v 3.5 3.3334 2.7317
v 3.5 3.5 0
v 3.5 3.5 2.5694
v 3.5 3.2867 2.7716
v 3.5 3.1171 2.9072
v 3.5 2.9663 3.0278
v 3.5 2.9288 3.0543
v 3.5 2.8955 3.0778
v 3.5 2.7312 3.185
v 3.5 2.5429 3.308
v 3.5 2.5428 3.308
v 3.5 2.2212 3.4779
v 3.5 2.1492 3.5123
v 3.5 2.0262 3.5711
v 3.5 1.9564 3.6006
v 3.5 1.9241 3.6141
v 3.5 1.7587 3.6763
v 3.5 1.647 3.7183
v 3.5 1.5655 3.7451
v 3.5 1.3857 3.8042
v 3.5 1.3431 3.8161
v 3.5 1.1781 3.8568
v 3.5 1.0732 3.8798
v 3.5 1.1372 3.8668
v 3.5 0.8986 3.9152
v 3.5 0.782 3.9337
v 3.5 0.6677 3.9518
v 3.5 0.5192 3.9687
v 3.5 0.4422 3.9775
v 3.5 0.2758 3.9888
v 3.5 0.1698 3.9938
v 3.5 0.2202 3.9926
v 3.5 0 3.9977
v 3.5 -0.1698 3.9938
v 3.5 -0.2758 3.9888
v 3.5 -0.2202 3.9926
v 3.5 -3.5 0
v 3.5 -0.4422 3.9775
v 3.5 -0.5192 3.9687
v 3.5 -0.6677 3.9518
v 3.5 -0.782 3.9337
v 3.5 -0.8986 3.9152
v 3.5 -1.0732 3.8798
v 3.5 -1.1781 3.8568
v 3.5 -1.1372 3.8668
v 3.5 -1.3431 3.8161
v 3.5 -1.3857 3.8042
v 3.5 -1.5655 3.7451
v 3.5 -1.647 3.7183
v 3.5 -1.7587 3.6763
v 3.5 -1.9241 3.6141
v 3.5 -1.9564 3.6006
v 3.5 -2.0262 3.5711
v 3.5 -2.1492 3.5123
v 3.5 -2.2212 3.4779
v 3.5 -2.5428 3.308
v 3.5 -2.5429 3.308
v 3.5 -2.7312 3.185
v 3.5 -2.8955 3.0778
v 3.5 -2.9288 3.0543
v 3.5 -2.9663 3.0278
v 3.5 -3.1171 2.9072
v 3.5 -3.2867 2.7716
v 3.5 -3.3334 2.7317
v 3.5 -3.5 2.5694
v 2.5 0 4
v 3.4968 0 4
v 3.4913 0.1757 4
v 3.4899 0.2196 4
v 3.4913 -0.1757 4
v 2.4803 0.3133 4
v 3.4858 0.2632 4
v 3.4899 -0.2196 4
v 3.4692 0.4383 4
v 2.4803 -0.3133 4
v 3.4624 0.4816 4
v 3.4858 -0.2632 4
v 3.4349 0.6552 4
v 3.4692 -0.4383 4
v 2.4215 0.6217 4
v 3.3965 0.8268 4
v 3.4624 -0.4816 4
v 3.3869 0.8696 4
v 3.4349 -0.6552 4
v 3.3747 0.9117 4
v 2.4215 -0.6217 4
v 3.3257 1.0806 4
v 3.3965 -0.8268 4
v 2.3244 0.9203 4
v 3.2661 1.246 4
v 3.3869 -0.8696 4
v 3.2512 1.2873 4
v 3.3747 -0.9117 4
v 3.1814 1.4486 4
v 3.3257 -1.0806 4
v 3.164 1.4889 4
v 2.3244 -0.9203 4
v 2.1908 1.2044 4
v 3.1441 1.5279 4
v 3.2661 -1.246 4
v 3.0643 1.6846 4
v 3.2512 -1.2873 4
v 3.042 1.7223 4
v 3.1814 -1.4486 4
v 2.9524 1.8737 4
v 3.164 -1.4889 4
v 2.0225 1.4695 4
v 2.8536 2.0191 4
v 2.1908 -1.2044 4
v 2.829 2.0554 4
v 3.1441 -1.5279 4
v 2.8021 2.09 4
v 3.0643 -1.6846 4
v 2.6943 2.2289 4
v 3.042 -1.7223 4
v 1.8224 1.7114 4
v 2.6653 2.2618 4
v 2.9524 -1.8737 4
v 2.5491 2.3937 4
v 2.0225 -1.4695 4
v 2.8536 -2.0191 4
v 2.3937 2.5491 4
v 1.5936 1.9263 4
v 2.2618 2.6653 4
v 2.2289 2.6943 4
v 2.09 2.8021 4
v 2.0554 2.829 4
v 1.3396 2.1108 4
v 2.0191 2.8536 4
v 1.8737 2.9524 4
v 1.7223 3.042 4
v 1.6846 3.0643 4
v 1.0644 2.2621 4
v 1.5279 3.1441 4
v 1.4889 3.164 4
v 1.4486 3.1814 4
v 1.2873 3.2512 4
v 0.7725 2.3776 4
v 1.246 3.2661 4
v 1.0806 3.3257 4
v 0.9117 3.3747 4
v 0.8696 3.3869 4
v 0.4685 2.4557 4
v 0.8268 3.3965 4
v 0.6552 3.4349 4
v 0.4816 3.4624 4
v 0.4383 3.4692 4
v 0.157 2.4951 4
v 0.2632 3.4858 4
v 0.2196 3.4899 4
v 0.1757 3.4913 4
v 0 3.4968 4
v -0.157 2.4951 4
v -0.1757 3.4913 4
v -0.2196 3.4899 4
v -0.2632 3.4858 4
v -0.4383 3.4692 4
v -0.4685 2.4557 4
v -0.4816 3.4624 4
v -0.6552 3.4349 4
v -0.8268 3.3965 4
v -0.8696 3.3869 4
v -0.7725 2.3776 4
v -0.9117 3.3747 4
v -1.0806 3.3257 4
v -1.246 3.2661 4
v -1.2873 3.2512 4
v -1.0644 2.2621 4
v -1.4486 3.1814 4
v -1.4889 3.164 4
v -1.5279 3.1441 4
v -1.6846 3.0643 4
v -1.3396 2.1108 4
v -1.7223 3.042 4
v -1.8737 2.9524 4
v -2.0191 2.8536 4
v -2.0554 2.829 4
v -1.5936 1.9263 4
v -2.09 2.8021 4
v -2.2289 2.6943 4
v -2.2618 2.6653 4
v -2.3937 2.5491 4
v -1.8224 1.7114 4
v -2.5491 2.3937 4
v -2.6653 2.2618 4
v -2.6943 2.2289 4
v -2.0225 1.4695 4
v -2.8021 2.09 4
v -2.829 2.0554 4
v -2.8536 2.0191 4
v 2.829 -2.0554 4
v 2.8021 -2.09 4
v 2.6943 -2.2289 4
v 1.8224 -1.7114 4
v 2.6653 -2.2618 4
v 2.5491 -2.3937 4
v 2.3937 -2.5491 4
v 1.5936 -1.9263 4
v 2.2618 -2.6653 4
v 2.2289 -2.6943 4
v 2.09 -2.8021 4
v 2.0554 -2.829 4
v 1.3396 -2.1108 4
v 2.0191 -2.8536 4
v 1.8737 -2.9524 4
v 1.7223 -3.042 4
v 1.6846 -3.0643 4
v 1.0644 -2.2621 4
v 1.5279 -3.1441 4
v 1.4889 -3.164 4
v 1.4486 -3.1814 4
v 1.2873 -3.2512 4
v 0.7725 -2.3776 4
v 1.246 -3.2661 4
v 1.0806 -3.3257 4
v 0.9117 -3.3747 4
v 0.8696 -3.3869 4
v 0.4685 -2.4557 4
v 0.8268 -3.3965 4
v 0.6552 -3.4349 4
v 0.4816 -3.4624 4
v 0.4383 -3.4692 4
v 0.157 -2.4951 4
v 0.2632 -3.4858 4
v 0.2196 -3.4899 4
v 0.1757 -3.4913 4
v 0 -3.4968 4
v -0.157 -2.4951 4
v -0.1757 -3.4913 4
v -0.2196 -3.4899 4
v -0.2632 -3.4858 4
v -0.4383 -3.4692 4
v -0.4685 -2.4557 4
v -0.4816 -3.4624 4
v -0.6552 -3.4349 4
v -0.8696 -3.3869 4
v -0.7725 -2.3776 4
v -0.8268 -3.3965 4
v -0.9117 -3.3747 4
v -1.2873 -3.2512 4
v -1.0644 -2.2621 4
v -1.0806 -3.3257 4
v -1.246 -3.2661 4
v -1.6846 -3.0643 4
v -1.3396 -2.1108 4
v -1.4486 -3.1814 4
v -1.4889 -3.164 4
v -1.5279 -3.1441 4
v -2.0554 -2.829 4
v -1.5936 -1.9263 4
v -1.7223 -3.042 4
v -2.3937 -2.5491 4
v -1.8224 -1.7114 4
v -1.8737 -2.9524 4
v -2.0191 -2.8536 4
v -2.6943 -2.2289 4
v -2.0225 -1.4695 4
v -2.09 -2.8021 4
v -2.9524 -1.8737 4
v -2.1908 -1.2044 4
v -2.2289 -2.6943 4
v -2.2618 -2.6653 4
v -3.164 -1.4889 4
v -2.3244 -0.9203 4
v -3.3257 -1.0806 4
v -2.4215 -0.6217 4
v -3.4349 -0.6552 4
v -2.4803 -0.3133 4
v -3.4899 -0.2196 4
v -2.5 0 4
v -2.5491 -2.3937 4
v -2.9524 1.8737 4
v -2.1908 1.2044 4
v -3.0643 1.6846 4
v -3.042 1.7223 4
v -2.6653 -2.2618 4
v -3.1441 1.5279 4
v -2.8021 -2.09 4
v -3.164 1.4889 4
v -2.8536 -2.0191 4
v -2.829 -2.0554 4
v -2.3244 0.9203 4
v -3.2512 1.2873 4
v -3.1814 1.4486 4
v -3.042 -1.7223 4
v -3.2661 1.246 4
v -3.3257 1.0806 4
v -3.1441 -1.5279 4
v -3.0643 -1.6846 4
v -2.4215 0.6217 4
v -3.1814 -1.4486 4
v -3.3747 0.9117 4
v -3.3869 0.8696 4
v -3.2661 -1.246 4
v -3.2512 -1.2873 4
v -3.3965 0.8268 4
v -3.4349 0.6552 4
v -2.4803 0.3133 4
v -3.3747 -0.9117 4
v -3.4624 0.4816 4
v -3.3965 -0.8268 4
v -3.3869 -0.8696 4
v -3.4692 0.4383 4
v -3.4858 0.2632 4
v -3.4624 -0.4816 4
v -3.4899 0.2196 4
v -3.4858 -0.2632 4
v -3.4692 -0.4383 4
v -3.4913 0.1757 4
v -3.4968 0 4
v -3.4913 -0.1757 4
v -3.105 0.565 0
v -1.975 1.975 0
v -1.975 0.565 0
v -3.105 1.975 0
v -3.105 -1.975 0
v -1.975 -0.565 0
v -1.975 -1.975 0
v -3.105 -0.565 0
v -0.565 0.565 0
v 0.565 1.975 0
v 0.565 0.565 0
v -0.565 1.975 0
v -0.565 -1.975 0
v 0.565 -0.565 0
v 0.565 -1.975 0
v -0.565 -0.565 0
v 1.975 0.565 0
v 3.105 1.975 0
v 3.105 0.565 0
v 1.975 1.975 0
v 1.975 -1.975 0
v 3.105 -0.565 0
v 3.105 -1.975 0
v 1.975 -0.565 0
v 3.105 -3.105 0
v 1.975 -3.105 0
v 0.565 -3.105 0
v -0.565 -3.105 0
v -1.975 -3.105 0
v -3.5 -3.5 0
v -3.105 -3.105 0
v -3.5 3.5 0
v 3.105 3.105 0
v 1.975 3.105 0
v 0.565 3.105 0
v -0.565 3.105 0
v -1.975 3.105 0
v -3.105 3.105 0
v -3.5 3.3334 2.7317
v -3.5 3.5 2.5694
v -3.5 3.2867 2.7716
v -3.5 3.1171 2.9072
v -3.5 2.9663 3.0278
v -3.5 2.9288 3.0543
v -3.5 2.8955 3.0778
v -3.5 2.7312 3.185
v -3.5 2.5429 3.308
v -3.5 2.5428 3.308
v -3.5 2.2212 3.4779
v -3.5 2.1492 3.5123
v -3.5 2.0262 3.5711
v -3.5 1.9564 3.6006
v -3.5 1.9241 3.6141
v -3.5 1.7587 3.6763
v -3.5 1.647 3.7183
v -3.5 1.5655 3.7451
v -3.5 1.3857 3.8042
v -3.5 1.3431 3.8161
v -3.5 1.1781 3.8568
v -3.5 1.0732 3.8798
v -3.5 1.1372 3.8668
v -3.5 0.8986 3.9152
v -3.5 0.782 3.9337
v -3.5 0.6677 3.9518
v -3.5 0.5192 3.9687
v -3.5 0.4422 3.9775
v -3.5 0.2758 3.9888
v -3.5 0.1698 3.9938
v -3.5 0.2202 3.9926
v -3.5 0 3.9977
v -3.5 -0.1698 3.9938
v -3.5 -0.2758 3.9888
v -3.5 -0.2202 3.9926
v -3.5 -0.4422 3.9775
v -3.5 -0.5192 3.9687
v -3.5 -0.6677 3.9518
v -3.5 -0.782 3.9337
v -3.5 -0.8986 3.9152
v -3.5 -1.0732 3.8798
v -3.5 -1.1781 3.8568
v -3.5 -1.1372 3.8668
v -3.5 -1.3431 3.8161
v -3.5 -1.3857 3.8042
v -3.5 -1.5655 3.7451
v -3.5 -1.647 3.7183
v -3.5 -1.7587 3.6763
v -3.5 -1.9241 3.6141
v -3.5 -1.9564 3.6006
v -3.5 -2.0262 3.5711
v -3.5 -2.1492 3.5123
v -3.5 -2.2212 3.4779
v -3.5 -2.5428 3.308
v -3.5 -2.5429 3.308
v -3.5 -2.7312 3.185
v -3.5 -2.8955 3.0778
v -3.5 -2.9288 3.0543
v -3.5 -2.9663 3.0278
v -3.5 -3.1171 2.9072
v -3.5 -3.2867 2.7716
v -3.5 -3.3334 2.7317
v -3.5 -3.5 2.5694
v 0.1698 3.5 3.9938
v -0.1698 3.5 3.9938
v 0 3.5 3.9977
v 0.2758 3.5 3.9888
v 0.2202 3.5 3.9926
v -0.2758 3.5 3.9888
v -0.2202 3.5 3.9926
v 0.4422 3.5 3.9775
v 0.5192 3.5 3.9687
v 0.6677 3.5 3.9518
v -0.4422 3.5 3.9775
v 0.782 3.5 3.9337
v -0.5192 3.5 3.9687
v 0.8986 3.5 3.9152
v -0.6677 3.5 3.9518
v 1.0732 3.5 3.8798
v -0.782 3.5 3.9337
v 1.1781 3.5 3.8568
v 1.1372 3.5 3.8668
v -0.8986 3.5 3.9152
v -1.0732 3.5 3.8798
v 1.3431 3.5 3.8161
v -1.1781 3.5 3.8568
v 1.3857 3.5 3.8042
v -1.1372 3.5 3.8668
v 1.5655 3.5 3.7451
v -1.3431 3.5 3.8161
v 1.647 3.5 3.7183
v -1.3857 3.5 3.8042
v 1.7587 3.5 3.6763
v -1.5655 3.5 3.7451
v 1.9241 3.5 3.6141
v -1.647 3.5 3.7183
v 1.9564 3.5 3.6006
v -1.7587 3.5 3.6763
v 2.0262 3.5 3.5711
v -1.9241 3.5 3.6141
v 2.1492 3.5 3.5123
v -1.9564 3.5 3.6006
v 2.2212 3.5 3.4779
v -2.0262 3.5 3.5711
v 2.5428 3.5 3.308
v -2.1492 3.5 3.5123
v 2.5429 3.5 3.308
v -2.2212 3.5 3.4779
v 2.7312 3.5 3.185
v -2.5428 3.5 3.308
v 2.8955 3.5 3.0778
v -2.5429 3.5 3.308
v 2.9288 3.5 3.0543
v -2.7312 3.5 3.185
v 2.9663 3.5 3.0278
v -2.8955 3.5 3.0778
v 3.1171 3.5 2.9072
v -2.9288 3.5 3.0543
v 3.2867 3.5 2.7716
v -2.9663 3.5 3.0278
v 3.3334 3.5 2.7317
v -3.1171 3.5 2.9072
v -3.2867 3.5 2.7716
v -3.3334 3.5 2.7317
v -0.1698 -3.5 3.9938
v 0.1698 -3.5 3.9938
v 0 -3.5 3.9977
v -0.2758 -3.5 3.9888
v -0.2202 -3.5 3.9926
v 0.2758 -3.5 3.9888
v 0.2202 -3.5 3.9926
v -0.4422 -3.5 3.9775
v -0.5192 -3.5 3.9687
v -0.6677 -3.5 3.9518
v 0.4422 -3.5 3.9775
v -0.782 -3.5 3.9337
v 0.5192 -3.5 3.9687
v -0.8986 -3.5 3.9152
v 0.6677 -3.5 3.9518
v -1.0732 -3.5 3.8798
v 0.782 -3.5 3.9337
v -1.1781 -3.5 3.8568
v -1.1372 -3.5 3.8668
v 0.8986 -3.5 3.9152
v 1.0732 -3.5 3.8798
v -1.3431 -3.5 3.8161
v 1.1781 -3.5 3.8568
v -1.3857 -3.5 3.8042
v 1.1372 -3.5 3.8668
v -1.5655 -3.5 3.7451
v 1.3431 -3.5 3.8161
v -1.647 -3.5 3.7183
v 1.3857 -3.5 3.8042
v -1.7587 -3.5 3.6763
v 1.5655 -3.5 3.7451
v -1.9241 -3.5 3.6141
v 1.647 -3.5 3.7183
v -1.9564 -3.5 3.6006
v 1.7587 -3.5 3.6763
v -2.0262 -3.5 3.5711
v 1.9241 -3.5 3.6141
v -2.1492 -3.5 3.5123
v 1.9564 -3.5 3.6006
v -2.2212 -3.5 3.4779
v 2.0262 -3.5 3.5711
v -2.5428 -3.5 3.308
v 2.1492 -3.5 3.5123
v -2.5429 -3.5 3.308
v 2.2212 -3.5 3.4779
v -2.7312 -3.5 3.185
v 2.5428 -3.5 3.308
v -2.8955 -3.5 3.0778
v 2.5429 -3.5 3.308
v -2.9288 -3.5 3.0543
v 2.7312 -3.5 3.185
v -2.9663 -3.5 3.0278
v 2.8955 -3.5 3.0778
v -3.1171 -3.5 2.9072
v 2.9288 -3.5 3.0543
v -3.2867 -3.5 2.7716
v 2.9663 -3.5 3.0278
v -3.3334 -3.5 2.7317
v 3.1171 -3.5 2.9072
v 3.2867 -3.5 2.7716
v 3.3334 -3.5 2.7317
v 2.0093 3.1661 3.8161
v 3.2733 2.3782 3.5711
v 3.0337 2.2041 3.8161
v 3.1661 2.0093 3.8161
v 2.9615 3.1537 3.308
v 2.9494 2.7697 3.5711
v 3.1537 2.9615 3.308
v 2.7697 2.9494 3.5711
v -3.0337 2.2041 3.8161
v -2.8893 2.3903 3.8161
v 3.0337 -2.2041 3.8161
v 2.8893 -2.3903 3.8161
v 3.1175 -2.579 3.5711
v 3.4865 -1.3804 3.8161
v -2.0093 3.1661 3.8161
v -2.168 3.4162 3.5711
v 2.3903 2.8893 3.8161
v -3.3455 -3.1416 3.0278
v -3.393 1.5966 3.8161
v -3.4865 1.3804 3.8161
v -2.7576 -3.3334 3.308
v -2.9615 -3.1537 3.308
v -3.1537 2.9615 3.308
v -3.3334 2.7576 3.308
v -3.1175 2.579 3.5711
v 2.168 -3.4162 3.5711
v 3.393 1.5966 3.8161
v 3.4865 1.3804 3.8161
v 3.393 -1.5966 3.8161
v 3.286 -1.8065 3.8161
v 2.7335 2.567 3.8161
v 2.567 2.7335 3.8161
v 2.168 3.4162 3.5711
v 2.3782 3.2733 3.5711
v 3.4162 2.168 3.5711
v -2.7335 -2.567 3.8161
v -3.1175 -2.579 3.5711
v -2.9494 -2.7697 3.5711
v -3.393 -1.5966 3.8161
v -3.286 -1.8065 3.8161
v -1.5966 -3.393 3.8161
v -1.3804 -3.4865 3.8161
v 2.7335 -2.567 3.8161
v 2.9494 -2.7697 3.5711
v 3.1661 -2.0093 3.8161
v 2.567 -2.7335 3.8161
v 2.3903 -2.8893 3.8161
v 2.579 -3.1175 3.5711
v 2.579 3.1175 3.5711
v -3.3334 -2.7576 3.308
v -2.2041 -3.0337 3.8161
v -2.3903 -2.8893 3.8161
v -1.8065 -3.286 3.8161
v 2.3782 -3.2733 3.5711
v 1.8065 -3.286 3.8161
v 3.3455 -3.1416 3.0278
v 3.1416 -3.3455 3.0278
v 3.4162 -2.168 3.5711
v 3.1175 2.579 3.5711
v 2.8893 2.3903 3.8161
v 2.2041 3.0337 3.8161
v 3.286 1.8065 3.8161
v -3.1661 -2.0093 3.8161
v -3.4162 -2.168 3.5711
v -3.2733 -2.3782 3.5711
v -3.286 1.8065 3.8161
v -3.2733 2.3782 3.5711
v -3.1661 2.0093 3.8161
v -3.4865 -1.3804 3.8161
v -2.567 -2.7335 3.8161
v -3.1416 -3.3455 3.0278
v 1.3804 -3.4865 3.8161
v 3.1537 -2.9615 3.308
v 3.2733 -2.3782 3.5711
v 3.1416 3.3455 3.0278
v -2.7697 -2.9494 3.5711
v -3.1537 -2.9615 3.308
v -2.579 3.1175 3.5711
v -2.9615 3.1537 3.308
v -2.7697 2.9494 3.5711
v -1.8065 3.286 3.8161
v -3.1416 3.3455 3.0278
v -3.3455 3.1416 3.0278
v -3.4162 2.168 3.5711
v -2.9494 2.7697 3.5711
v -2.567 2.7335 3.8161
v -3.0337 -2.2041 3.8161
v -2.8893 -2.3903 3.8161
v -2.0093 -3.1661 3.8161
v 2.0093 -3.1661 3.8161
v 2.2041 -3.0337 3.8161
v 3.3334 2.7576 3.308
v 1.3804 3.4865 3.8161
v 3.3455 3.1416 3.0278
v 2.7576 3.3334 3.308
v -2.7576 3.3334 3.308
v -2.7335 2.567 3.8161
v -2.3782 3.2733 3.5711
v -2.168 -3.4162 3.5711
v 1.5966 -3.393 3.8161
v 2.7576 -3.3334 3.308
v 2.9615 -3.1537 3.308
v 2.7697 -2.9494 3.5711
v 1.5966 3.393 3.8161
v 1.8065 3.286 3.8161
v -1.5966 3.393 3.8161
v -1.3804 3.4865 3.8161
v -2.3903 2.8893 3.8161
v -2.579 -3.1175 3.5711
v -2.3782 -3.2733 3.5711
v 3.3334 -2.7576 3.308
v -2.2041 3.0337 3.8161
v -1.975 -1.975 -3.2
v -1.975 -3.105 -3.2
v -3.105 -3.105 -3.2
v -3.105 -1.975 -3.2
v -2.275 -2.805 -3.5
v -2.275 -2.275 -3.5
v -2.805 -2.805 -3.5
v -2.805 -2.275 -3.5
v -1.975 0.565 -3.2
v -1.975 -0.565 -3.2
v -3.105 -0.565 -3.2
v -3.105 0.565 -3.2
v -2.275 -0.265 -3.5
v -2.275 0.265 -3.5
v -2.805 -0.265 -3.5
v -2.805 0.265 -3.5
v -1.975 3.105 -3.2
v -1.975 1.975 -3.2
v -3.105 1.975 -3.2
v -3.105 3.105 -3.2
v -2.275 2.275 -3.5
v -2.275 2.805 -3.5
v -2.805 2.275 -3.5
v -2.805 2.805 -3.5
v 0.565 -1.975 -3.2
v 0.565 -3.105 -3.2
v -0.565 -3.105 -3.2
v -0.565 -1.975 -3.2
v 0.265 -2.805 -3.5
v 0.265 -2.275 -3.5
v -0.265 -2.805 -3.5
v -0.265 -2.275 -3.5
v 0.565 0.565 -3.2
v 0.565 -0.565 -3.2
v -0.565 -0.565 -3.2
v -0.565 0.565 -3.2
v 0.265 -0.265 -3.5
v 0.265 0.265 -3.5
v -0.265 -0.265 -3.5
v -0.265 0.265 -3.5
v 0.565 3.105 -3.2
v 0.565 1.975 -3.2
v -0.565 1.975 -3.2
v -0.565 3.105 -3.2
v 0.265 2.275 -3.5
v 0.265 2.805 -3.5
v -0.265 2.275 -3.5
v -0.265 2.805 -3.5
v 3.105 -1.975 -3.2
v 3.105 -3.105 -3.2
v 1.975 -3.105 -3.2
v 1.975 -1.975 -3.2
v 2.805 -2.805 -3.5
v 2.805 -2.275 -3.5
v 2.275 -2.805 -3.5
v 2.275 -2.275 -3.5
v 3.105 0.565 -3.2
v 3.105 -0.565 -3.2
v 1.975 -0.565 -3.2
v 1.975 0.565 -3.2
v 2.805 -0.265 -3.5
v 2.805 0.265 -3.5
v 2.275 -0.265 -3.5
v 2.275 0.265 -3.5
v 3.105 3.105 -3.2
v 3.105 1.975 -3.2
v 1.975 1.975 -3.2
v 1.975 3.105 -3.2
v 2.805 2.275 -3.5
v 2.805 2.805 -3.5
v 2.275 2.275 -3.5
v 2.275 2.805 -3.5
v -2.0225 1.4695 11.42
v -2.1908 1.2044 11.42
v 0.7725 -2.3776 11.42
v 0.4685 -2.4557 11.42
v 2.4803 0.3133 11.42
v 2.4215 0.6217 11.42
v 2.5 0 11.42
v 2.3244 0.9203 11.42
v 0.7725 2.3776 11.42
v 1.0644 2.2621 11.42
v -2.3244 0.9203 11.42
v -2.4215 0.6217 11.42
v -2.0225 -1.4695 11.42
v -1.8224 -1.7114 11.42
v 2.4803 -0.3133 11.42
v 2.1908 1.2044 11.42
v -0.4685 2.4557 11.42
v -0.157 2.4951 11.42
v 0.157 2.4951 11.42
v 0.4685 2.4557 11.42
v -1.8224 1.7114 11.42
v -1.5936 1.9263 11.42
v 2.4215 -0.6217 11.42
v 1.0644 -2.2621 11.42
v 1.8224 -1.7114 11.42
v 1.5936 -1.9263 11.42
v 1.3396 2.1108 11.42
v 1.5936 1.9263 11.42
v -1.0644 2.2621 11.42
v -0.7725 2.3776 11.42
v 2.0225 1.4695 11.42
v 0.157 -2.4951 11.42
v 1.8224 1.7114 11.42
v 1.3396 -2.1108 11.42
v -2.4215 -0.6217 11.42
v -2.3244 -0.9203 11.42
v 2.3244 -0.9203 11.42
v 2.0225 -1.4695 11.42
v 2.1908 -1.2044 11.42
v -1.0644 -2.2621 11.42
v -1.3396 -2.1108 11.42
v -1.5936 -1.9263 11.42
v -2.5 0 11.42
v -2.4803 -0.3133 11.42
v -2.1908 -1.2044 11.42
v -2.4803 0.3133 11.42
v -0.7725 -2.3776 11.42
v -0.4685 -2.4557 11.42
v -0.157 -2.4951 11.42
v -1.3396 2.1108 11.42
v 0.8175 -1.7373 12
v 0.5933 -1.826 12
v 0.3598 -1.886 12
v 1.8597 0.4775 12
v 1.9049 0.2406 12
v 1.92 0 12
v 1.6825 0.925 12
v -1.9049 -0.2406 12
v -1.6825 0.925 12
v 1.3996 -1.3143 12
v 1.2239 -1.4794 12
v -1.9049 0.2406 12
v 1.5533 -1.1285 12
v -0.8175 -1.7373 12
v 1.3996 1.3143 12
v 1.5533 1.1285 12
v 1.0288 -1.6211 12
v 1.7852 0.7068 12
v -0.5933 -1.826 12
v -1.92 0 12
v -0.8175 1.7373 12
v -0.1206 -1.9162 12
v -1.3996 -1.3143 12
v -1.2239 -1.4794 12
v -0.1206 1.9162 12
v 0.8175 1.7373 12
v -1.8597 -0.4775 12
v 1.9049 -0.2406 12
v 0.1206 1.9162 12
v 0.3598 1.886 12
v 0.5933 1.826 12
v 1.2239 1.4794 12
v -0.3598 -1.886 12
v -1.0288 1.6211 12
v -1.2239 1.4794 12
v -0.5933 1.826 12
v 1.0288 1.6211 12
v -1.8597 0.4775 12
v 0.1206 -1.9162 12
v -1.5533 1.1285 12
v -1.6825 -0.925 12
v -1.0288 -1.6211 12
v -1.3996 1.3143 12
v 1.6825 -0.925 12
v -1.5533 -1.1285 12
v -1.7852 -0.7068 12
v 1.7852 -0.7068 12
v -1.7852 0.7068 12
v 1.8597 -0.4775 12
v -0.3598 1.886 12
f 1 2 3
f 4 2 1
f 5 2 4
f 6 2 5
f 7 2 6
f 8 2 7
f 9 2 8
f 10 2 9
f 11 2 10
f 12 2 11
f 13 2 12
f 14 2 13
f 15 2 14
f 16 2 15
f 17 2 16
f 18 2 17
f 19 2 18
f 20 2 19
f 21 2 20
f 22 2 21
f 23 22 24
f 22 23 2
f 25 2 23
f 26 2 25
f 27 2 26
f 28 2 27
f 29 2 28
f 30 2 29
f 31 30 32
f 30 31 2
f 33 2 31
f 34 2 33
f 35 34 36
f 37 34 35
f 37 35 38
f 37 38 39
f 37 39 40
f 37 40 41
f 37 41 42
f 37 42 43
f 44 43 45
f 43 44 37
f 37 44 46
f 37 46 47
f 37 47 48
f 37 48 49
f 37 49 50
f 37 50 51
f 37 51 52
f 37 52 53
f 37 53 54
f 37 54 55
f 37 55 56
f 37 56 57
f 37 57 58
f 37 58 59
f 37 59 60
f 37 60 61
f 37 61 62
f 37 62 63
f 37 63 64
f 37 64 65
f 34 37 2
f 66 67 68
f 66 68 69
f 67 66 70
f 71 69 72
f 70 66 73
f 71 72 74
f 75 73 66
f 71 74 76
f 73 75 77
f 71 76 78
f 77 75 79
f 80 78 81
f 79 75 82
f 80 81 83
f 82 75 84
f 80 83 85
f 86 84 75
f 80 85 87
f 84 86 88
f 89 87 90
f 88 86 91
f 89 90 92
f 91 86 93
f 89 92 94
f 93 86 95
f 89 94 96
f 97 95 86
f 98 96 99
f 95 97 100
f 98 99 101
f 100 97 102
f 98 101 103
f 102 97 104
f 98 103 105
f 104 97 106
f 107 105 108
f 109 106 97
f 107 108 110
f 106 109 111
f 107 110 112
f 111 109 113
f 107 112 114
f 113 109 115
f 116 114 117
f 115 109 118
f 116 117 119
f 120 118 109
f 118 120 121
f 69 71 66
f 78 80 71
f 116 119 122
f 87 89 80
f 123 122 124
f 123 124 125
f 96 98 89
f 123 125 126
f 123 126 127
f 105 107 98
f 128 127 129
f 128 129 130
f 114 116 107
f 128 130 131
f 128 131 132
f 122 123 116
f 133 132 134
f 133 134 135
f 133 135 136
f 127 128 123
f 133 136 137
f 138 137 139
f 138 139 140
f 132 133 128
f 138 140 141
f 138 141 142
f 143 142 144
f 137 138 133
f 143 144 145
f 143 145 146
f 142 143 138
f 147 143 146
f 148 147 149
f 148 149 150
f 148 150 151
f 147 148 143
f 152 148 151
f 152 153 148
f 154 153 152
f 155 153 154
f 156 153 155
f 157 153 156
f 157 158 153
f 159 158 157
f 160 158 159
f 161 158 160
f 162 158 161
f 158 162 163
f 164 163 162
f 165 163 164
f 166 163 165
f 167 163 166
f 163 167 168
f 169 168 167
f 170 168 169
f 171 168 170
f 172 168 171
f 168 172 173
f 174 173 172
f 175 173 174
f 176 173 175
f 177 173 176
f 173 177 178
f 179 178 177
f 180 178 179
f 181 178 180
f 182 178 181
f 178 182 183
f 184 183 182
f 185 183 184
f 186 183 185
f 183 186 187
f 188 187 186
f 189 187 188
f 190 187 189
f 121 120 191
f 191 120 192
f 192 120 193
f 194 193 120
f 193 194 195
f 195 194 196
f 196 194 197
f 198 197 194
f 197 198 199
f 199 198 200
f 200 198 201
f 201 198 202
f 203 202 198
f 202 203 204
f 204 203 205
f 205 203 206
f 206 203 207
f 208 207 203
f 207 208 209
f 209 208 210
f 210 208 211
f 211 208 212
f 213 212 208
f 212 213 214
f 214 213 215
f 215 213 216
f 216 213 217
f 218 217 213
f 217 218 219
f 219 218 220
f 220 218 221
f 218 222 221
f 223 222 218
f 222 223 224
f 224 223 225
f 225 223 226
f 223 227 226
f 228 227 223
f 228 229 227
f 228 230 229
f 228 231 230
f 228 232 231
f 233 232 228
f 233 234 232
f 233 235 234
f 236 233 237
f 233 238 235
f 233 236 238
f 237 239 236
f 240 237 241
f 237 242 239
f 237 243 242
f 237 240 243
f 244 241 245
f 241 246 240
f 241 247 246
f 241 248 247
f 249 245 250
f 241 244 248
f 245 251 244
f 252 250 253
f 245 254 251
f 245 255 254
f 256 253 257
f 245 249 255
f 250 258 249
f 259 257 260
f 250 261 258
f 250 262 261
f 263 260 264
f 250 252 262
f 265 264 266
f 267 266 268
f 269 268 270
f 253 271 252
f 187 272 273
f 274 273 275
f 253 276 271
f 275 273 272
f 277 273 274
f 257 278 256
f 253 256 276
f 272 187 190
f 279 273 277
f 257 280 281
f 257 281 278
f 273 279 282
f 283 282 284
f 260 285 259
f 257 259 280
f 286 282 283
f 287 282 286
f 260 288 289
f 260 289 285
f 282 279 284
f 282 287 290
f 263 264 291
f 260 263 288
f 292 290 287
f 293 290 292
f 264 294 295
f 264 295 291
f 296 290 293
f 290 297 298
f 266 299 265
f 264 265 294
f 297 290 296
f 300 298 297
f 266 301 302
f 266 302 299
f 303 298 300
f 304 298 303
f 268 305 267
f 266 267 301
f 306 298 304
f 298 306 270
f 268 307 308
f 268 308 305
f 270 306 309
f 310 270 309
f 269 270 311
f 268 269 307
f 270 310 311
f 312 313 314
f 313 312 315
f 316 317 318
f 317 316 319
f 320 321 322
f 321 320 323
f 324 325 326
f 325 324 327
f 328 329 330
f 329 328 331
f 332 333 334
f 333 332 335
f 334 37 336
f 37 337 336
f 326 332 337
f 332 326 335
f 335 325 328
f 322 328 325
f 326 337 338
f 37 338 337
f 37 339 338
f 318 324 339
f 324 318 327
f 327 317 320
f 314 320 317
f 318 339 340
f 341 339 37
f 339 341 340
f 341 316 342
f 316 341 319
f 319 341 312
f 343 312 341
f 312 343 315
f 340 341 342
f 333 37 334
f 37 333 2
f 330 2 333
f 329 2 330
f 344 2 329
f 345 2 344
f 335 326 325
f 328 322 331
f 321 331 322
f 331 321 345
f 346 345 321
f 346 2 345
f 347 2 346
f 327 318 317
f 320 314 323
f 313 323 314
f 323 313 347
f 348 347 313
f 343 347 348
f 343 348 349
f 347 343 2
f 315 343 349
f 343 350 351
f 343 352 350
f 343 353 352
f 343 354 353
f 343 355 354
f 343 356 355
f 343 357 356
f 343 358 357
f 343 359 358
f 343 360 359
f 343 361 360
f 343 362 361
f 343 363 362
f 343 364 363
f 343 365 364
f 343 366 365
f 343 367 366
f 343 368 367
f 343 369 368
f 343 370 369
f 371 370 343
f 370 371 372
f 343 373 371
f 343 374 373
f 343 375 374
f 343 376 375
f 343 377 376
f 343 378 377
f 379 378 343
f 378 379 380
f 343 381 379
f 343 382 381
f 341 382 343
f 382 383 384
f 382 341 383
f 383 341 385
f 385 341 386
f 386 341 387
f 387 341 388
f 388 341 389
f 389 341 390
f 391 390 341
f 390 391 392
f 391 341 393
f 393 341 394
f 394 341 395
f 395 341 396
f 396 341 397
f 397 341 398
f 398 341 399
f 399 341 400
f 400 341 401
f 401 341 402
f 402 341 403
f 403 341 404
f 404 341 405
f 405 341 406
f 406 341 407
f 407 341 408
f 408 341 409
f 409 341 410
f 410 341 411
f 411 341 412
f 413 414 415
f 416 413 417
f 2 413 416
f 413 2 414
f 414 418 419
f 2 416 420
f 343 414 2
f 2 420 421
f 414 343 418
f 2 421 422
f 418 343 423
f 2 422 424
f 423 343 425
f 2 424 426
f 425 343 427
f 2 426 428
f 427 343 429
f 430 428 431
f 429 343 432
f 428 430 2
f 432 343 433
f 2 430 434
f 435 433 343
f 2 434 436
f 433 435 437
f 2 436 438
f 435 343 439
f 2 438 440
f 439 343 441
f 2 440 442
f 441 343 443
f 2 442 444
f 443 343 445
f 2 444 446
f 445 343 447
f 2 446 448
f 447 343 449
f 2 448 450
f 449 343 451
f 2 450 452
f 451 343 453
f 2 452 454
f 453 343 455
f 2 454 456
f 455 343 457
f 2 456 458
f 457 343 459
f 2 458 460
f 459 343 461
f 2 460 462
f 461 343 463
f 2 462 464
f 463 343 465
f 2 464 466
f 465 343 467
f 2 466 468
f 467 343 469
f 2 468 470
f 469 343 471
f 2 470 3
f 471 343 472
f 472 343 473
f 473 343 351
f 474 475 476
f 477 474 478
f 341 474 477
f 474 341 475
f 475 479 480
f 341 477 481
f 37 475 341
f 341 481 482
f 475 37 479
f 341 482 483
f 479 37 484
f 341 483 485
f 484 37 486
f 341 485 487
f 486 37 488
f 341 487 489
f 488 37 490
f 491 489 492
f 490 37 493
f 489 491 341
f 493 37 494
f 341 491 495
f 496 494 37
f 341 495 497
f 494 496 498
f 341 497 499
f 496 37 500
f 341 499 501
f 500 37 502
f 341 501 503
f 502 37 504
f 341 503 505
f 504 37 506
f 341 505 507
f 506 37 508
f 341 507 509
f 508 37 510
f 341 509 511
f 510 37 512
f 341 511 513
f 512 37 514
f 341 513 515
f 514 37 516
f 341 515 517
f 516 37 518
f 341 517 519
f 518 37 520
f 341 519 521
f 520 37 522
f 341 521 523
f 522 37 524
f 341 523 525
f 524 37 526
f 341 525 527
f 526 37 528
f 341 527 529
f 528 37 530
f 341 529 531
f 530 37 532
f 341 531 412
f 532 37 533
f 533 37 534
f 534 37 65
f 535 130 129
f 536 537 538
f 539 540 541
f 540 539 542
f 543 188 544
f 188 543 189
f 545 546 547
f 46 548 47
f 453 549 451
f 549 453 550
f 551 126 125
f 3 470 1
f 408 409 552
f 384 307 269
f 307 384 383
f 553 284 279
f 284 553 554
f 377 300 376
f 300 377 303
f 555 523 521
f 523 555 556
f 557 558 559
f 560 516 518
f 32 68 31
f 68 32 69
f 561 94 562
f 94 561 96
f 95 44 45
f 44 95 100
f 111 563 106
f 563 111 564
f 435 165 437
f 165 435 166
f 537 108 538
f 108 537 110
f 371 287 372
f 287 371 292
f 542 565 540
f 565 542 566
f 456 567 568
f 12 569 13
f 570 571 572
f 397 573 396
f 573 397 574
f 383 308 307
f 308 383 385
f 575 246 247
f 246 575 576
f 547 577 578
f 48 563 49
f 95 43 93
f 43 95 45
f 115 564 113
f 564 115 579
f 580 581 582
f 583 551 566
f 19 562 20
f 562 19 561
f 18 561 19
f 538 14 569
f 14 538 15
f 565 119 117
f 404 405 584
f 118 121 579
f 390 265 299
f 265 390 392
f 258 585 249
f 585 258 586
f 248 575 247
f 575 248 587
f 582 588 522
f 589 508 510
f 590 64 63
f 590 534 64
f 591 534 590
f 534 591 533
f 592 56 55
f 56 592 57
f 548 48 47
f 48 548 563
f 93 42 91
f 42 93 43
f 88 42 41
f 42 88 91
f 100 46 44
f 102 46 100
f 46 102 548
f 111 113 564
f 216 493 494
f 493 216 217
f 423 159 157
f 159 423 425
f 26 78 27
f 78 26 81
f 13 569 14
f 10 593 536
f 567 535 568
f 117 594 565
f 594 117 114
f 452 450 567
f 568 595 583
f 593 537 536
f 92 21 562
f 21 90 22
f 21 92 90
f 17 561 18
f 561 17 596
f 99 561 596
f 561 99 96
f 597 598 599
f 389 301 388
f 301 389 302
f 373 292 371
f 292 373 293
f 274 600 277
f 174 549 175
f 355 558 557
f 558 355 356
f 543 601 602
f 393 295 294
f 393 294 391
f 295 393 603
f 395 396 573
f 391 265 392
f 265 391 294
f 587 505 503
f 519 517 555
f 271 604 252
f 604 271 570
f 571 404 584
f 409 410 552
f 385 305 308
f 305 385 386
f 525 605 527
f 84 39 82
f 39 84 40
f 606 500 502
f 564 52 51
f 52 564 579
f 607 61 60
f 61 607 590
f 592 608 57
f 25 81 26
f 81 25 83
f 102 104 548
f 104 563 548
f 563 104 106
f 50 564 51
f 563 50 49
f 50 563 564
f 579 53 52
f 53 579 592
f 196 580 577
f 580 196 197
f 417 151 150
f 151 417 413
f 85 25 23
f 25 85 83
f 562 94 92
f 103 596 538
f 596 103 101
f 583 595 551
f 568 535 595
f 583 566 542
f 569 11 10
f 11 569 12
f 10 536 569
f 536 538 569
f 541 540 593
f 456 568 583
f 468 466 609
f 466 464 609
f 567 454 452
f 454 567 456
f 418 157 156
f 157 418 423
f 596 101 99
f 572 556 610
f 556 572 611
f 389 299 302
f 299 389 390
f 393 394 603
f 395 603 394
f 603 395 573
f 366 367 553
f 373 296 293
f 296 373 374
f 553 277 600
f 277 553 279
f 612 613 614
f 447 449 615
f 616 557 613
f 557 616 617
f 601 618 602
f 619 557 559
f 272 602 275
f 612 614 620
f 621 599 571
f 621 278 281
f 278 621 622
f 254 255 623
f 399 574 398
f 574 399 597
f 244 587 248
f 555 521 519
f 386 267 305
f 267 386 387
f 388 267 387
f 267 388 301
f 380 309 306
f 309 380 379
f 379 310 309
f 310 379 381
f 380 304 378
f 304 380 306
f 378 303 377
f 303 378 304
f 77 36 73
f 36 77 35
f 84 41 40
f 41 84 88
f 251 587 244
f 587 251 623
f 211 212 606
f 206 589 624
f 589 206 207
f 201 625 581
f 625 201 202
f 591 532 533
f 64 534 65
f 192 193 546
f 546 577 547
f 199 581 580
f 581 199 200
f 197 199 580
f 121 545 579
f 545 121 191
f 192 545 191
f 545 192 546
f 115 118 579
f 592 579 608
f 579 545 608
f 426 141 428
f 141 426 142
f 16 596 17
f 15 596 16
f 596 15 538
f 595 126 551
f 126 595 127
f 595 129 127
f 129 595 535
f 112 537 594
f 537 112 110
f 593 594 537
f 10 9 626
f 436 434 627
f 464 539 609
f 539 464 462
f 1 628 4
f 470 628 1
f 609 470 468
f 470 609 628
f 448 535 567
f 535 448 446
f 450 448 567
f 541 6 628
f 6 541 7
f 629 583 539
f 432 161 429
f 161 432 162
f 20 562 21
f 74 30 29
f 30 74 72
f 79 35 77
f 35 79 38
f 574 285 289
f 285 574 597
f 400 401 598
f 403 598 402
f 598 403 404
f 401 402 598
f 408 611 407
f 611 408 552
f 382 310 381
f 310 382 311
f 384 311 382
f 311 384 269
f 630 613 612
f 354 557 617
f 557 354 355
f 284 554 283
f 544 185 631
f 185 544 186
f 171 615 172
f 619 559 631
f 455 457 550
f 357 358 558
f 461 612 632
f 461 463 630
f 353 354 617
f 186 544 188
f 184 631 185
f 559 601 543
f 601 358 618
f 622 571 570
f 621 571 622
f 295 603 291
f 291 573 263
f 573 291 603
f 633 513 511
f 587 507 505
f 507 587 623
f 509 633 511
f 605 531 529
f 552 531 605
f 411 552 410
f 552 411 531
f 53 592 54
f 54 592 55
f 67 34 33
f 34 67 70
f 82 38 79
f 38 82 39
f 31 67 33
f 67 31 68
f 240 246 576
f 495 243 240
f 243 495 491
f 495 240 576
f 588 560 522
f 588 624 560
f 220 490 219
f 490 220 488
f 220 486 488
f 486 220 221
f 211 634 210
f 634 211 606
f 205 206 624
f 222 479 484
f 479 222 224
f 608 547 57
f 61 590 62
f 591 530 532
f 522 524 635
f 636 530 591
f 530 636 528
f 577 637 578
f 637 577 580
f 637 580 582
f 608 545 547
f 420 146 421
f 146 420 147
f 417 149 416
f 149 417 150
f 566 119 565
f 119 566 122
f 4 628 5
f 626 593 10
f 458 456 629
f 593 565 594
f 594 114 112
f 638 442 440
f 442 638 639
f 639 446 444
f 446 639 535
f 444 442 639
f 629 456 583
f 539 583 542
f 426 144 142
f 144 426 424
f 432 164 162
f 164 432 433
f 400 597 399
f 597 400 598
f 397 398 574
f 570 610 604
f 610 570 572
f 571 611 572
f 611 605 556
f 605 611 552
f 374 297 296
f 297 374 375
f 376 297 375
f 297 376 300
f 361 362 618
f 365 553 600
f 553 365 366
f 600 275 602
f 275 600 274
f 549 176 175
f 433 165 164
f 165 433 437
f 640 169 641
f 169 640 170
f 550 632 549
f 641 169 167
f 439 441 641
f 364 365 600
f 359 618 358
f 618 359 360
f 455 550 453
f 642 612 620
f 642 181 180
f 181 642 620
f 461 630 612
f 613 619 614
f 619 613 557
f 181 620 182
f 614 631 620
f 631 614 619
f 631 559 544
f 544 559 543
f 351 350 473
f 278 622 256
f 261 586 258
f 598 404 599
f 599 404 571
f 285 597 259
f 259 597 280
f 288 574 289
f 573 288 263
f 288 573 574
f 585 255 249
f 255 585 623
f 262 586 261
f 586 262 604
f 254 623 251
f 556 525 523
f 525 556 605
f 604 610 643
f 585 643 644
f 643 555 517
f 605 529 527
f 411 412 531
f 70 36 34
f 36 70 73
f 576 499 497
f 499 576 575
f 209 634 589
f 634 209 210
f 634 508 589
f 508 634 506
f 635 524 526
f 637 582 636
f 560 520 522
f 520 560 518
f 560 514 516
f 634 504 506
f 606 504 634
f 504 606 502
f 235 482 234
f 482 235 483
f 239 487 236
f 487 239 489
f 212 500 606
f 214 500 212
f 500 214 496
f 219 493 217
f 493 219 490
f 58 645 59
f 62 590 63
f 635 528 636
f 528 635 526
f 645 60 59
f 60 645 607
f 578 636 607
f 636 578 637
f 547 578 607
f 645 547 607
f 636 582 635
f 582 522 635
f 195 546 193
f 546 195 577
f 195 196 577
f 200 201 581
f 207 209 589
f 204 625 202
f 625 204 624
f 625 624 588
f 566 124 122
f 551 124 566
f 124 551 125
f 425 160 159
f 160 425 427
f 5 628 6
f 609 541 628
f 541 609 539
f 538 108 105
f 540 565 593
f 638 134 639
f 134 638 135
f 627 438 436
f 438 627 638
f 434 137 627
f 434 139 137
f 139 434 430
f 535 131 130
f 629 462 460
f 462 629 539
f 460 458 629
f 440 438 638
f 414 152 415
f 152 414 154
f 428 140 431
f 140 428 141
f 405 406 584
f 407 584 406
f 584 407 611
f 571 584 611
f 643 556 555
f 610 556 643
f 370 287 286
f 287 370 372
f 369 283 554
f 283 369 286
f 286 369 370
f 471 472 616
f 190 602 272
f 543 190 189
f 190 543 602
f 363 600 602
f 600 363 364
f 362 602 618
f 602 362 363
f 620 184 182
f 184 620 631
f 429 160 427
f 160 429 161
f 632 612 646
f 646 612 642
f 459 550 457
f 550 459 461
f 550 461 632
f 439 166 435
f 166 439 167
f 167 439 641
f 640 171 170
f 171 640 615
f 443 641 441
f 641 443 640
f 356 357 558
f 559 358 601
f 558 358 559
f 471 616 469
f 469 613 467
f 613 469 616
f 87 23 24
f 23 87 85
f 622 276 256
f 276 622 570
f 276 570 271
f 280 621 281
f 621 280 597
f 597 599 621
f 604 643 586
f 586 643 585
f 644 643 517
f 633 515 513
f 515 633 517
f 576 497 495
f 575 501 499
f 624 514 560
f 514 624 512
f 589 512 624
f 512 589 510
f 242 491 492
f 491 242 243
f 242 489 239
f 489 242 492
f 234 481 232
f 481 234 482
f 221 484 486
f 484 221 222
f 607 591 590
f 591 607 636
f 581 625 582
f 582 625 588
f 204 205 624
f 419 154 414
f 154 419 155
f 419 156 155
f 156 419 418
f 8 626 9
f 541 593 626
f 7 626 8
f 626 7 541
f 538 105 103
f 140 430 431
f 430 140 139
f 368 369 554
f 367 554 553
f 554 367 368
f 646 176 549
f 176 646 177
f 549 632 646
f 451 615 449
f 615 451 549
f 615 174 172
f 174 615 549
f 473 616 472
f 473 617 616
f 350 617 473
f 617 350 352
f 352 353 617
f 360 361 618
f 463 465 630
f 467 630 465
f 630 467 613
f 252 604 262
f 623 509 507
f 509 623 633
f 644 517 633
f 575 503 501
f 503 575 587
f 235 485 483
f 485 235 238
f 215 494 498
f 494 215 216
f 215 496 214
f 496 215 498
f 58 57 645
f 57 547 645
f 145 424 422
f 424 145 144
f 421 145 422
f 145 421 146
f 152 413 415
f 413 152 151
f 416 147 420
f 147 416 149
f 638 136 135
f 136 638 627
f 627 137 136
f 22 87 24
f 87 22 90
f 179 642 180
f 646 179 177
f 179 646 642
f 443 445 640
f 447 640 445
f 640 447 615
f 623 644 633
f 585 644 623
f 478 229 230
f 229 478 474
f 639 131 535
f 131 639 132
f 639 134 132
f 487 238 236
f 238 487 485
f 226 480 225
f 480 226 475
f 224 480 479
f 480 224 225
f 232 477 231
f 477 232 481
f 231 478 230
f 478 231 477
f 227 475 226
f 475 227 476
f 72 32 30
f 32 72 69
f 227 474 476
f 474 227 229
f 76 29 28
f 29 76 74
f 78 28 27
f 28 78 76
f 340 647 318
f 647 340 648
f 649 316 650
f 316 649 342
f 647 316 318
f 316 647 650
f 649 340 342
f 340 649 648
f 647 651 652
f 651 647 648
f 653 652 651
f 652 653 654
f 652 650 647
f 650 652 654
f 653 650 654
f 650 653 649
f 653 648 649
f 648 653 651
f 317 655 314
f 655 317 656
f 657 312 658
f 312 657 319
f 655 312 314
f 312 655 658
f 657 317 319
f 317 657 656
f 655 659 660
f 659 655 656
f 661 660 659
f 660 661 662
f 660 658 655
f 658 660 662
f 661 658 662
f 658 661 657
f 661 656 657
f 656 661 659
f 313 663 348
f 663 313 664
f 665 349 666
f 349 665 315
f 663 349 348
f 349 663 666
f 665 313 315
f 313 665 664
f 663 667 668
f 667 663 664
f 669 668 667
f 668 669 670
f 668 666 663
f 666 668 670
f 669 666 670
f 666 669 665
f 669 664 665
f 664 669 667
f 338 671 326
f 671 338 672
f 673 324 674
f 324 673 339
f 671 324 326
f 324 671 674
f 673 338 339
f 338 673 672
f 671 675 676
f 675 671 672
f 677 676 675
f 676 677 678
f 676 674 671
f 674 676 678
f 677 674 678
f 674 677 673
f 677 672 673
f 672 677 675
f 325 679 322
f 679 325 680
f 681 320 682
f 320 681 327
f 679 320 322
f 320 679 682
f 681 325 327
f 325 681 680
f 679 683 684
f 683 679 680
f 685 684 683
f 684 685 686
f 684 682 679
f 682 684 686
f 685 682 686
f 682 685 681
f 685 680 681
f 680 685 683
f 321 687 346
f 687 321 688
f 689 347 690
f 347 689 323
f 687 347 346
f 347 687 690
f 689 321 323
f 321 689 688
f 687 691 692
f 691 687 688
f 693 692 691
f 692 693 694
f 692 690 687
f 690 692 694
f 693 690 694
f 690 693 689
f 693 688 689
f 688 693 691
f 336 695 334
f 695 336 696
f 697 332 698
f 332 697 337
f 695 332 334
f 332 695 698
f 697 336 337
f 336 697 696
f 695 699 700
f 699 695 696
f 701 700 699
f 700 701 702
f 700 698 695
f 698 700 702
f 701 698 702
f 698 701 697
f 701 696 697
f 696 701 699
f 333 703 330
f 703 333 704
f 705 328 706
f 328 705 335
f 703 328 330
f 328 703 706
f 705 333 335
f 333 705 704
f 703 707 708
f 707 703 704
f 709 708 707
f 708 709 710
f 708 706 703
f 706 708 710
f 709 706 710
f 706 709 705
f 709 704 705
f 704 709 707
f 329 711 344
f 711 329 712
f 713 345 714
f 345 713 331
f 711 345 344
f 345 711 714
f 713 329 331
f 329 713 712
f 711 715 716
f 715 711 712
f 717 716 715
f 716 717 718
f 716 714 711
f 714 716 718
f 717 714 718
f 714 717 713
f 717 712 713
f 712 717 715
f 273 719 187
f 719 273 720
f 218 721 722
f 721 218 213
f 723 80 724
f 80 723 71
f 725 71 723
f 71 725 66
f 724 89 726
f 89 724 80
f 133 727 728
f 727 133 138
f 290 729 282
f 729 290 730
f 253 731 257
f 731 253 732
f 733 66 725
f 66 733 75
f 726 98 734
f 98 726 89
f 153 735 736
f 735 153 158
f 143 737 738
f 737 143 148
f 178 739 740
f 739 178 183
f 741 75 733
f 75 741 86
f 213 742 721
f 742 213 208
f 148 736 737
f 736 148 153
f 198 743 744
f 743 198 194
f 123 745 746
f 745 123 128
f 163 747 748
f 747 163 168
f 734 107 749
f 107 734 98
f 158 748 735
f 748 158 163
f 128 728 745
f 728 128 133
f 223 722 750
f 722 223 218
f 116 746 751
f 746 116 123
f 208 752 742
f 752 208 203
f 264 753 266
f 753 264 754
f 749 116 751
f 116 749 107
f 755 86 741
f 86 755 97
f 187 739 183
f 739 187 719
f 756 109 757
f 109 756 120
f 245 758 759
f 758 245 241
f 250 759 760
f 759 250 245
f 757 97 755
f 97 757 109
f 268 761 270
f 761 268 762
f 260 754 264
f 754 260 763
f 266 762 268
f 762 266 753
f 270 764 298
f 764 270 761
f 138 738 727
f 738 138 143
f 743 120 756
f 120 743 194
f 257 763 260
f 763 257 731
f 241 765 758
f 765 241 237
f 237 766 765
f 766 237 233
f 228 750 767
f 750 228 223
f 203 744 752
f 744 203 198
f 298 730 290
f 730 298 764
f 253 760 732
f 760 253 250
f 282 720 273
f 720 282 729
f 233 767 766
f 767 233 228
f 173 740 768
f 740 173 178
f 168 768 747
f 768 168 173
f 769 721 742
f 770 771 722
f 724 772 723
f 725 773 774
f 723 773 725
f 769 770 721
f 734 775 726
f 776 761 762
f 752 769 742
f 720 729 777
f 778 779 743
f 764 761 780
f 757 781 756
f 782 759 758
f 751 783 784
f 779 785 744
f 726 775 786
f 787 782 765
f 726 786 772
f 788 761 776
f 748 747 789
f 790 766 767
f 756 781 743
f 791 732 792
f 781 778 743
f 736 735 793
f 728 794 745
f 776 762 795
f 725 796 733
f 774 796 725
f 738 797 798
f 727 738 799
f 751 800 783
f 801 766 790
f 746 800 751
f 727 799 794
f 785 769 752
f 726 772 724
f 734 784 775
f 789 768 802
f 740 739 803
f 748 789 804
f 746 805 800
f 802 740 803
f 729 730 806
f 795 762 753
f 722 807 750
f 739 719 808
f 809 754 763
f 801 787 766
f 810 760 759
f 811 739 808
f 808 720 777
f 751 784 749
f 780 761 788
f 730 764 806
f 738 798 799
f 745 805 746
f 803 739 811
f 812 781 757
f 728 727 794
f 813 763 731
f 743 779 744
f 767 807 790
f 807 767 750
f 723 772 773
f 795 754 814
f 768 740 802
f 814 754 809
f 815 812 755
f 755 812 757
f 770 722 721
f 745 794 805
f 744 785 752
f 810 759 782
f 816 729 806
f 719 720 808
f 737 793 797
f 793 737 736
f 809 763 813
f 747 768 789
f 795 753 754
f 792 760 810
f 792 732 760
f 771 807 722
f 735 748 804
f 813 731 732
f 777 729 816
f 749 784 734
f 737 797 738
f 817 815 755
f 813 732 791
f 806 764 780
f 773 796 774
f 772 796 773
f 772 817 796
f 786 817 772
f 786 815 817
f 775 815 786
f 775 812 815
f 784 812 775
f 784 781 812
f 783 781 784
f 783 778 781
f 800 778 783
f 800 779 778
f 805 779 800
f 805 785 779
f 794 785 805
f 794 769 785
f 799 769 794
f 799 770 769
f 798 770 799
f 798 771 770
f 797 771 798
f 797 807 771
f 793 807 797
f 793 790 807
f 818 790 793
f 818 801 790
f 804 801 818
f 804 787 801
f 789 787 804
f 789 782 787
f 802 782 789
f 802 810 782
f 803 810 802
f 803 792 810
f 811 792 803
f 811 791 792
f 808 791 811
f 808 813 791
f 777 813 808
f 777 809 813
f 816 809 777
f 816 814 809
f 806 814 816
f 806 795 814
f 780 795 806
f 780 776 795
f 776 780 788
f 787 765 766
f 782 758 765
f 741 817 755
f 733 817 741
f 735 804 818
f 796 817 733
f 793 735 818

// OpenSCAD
$fn=50;
metalSilverCol=[0.50754, 0.50754, 0.50754]; //KiCAD Color

redCube_THT();
module redCube_THT(size=[7,7,12],threatDia=5,threatLen=8,pins=9){
  //example 7461001
  bdyDims=[size.x,size.y,size.z-threatLen];
  segmentHght=1.1; //height of the rounding above the body
  cornerRad=sphereSegment(size.x/2,segmentHght);
  threatChamfer=0.58;
  pinDims=[1.13,1.13,3.5];
  pinCnt=sqrt(pins);
  pitch=2.54;
  
  //body
  color(metalSilverCol) intersection(){
    translate([0,0,bdyDims.z/2]) cube(bdyDims,true);
    translate([0,0,-cornerRad+bdyDims.z+segmentHght]) sphere(r=cornerRad,$fn=100);
  }
  //threat
  color(metalSilverCol) translate([0,0,bdyDims.z]) 
    cylinder(d=threatDia,h=threatLen-threatChamfer);
  color(metalSilverCol) translate([0,0,size.z-threatChamfer]) 
    cylinder(d1=threatDia,d2=threatDia-threatChamfer*2,h=threatChamfer);
  
  //pins
  for (ix=[-(pinCnt-1)/2:(pinCnt-1)/2],iy=[-(pinCnt-1)/2:(pinCnt-1)/2])
    color(metalSilverCol) translate([ix*pitch,iy*pitch,0]) pin();
  
  module pin(){
    chamfer=0.3;
    translate([0,0,-(pinDims.z-chamfer)/2]) cube([pinDims.x,pinDims.y,pinDims.z-chamfer],true);
    translate([0,0,-pinDims.z+chamfer/2]) rotate([180,0,0]) frustum([pinDims.x,pinDims.y,chamfer],45,center=true);
  }
}

//2rh=a²+h² (a=segment radius, h=segment height, r=sphere radius)
function sphereSegment(a, h)=(pow(a,2)+pow(h,2))/(2*h);

*frustum(center=false);
module frustum(size=[1,1,1], flankAng=5, center=false, method="poly"){
  //cube with a trapezoid crosssection
  //https://en.wikibooks.org/wiki/OpenSCAD_User_Manual/Primitive_Solids#polyhedron
  
  
  flankRed=tan(flankAng)*size.z; //reduction in width by angle
  faceScale=[(size.x-flankRed*2)/size.x,(size.y-flankRed*2)/size.y]; //scale factor for linExt
  
  if (method=="linExt"){
    cntrOffset= (center) ? [0,0,-size.z/2] : [size.x/2,size.y/2,0];
    translate(cntrOffset)
      linear_extrude(size.z,scale=faceScale) 
        square([size.x,size.y],true);
  }
  else{ //for export to FreeCAD/StepUp
    cntrOffset= (center) ? [0,0,0] : [size.x/2,size.y/2,size.z/2];
    polys= [[-size.x/2,-size.y/2,-size.z/2], //0
            [ size.x/2,-size.y/2,-size.z/2], //1
            [ size.x/2, size.y/2,-size.z/2], //2
            [-size.x/2, size.y/2,-size.z/2],//3
            [-(size.x/2-flankRed),-(size.y/2-flankRed),size.z/2], //4
            [  size.x/2-flankRed ,-(size.y/2-flankRed),size.z/2], //5
            [  size.x/2-flankRed , (size.y/2-flankRed),size.z/2], //5
            [-(size.x/2-flankRed), (size.y/2-flankRed),size.z/2]]; //5
    faces= [[0,1,2,3],  // bottom
            [4,5,1,0],  // front
            [7,6,5,4],  // top
            [5,6,2,1],  // right
            [6,7,3,2],  // back
            [7,4,0,3]]; // left
    translate(cntrOffset) polyhedron(polys,faces);
  }
}
